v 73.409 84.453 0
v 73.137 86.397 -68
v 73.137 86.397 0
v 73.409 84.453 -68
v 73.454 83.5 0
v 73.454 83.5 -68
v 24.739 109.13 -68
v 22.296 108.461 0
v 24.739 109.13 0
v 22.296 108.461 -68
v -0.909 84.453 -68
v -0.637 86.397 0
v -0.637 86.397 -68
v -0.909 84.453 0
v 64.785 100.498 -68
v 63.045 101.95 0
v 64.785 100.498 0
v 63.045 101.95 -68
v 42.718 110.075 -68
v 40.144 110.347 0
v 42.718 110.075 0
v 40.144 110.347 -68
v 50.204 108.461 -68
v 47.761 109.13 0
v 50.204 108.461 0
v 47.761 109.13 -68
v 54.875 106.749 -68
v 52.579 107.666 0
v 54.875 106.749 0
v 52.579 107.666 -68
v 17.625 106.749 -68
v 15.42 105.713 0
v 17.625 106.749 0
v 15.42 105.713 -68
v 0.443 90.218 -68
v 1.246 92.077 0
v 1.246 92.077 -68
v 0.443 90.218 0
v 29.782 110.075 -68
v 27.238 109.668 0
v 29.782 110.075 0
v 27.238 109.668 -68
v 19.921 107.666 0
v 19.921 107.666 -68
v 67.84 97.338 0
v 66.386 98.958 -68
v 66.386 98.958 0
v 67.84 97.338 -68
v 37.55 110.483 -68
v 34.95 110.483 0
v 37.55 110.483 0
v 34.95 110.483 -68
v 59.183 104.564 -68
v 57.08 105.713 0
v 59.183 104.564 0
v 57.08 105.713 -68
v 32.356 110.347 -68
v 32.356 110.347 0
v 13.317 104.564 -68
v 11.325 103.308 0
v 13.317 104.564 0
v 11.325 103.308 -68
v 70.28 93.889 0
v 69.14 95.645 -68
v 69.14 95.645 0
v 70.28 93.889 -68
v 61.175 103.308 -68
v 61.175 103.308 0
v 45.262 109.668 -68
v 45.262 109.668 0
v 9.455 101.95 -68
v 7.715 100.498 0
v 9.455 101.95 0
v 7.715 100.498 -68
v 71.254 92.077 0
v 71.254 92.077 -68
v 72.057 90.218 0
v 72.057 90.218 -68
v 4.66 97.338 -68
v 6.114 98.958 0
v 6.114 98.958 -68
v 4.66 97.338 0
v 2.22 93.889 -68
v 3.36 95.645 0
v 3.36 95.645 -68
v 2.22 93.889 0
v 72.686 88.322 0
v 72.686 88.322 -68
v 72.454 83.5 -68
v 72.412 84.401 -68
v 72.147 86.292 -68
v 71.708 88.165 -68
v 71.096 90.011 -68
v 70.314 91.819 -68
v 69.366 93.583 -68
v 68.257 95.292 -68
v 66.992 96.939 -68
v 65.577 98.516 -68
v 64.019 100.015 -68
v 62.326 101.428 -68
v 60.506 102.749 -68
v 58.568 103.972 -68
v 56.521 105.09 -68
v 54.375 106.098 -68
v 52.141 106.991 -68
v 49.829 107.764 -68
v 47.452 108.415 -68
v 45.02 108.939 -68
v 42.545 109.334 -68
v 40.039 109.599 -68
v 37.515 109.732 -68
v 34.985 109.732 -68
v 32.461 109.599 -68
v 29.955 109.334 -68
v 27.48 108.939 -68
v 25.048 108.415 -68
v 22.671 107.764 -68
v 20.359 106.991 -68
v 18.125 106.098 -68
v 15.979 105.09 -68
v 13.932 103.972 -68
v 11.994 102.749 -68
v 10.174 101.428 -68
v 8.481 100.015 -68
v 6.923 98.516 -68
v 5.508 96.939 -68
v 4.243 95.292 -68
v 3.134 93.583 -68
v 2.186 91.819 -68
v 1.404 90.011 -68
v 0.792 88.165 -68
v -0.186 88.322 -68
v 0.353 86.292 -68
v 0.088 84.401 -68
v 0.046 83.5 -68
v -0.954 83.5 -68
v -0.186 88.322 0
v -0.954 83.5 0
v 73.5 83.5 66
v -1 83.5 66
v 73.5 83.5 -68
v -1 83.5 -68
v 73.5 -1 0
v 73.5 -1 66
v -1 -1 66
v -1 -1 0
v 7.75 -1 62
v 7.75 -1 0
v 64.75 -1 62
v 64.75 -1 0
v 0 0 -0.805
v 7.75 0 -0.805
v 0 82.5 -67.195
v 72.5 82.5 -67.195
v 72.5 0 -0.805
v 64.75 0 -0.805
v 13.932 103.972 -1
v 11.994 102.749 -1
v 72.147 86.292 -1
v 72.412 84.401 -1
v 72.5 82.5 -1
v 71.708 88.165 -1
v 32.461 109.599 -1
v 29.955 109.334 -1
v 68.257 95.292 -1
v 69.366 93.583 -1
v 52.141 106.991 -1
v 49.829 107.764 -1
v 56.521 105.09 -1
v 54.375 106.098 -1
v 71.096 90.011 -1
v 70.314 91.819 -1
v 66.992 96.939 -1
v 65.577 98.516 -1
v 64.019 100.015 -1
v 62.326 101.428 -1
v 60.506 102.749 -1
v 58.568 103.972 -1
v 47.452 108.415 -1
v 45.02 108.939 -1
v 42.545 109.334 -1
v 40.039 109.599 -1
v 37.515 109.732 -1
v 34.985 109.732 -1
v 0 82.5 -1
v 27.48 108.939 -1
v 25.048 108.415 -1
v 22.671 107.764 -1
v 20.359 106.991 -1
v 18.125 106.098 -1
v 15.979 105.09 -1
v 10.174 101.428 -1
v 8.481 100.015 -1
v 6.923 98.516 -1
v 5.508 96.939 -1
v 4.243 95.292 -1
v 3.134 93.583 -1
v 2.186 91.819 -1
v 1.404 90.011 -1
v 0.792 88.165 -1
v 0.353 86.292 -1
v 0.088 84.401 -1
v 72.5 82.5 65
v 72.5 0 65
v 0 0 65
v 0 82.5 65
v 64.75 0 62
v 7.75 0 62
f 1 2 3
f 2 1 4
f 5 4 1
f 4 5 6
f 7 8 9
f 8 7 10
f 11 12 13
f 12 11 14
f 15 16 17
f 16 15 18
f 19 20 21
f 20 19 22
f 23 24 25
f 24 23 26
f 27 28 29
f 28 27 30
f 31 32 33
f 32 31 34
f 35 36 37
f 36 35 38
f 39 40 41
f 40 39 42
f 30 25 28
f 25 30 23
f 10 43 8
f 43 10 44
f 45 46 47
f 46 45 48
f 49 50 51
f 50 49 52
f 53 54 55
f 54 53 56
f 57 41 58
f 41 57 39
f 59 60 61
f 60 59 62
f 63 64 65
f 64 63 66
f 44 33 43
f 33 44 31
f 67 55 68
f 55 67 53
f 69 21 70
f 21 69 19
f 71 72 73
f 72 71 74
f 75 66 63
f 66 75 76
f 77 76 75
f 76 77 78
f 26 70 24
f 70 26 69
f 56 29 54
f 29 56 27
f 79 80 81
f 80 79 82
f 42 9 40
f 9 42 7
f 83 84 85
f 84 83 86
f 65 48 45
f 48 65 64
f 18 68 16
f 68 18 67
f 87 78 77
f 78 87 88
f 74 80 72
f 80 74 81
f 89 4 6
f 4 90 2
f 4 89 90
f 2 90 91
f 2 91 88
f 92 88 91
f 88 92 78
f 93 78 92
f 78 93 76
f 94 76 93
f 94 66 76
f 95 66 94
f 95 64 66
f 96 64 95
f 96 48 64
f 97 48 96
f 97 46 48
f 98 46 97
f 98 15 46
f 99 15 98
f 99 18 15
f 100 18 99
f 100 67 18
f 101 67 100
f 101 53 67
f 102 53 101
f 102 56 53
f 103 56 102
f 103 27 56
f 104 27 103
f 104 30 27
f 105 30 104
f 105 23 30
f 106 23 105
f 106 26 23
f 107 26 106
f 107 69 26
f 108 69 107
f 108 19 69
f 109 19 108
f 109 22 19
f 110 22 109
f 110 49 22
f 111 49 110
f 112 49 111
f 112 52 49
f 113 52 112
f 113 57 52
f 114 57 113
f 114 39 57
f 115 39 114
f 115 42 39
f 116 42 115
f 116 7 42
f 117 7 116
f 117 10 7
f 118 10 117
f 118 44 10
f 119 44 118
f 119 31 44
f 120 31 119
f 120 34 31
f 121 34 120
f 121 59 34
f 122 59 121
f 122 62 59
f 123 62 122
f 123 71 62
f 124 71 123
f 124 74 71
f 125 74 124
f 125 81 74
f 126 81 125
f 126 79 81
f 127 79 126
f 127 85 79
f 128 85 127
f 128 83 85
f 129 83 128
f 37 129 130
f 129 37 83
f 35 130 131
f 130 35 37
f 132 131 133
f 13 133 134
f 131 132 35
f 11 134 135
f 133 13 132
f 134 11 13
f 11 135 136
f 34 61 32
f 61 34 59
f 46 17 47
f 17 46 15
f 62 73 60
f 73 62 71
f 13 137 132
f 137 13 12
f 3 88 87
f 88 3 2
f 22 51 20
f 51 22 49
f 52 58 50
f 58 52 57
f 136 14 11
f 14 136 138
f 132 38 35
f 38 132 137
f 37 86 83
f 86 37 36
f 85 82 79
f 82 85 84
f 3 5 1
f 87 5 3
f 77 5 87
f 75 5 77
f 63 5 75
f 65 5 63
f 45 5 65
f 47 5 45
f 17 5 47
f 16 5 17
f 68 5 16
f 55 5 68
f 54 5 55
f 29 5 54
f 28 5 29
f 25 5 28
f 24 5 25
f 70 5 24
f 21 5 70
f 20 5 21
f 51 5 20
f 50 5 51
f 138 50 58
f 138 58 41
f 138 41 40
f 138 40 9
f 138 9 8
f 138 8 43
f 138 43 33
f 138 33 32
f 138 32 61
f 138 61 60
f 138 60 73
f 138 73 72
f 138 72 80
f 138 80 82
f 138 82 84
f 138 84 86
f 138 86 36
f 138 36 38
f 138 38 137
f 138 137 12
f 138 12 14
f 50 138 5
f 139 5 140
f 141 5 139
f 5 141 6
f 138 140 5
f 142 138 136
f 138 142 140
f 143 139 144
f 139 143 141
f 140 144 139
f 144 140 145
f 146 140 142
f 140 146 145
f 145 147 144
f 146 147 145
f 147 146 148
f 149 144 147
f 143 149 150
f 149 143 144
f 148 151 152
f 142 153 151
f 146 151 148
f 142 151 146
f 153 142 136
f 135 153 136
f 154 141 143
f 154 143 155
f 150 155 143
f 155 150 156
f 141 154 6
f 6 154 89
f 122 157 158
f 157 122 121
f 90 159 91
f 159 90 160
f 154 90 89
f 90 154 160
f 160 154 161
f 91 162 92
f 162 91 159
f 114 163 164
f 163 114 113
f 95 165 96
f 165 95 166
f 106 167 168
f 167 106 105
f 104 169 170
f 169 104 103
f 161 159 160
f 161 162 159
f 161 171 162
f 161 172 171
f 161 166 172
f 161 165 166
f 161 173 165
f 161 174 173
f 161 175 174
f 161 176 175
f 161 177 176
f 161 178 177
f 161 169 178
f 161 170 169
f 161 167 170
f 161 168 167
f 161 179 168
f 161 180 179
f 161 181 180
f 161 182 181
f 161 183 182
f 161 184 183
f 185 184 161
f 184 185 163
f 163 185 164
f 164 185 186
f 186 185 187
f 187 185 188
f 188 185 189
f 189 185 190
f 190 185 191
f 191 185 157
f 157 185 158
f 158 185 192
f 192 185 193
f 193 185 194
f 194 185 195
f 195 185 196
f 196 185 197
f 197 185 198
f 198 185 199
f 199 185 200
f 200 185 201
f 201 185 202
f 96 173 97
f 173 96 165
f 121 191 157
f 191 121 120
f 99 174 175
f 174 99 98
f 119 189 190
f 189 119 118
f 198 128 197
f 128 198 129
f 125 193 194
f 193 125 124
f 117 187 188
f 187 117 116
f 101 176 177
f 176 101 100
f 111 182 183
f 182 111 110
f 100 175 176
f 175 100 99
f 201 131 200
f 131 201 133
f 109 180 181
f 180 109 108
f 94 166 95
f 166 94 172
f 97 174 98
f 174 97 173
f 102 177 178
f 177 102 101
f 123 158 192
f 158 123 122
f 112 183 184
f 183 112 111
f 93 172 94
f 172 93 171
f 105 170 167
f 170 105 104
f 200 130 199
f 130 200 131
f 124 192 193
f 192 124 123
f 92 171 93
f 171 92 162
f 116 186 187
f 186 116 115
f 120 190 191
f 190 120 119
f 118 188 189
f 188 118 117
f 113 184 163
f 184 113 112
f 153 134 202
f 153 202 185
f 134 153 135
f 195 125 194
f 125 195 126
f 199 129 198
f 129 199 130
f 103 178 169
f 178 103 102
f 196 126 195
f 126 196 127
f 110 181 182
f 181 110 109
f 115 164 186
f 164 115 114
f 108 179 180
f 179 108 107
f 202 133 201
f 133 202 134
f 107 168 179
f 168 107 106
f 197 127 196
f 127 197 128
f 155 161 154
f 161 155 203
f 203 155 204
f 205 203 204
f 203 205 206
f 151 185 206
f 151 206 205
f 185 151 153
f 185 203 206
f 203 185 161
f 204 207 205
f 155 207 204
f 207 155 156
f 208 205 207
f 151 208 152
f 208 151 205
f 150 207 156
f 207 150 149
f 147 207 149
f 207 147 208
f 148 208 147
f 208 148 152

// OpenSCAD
inner_width=72.5;
inner_depth=82.5;
default_hull_width=1;
box_height=65;
height=133;
width=inner_width+2*default_hull_width;
depth=inner_depth+2*default_hull_width;
cylinder_inner_d1=27*2;
cylinder_d1=cylinder_inner_d1+(2*default_hull_width);
cylinder_inner_d2=inner_width;
cylinder_d2=width;
hole_width=57;
hole_height=63; // could also be 57

difference()
{
    union(){
        translate([-default_hull_width, -default_hull_width, 0]){
            translate([0, 0, -(height-box_height)]){
                difference(){
                    translate([(inner_width/2)+default_hull_width, depth-default_hull_width,0]){
                        scale([1, cylinder_d1/cylinder_d2, 1]){
                            cylinder(d=cylinder_d2, h=height-box_height, $fn=90);
                        }
                    }
                    cube([width,depth,height-box_height]);
                }
            }
            cube([
                width,
                depth,
                box_height + default_hull_width]
            );
            polyhedron(
                [
                    [0,0,0],
                    [width, 0, 0],
                    [width, depth, 0],
                    [0, depth, 0], 
                    [width, depth, box_height - height],
                    [0, depth, box_height - height] 
                ], [
                    [0, 3, 2, 1],
                    [0, 1, 4, 5],
                    [0, 5, 3],
                    [1, 2, 4],
                    [2, 3, 5, 4]
                ]
            );
            
        }
        
        
    }
    union(){
        translate([(inner_width/2), depth-2*default_hull_width,-(height-box_height+default_hull_width)]){
            scale([1, cylinder_d1/cylinder_d2, 1]){
                cylinder(d=cylinder_inner_d2, h=height-box_height, $fn=90);
            }
        }
        translate([0, 0, -(height-box_height)]){
            cube([inner_width,inner_depth,height]);
        }
        translate([(width-hole_width)/2-default_hull_width, -default_hull_width, -default_hull_width]){
            cube([hole_width, 5, hole_height]);
        }
    }
}
